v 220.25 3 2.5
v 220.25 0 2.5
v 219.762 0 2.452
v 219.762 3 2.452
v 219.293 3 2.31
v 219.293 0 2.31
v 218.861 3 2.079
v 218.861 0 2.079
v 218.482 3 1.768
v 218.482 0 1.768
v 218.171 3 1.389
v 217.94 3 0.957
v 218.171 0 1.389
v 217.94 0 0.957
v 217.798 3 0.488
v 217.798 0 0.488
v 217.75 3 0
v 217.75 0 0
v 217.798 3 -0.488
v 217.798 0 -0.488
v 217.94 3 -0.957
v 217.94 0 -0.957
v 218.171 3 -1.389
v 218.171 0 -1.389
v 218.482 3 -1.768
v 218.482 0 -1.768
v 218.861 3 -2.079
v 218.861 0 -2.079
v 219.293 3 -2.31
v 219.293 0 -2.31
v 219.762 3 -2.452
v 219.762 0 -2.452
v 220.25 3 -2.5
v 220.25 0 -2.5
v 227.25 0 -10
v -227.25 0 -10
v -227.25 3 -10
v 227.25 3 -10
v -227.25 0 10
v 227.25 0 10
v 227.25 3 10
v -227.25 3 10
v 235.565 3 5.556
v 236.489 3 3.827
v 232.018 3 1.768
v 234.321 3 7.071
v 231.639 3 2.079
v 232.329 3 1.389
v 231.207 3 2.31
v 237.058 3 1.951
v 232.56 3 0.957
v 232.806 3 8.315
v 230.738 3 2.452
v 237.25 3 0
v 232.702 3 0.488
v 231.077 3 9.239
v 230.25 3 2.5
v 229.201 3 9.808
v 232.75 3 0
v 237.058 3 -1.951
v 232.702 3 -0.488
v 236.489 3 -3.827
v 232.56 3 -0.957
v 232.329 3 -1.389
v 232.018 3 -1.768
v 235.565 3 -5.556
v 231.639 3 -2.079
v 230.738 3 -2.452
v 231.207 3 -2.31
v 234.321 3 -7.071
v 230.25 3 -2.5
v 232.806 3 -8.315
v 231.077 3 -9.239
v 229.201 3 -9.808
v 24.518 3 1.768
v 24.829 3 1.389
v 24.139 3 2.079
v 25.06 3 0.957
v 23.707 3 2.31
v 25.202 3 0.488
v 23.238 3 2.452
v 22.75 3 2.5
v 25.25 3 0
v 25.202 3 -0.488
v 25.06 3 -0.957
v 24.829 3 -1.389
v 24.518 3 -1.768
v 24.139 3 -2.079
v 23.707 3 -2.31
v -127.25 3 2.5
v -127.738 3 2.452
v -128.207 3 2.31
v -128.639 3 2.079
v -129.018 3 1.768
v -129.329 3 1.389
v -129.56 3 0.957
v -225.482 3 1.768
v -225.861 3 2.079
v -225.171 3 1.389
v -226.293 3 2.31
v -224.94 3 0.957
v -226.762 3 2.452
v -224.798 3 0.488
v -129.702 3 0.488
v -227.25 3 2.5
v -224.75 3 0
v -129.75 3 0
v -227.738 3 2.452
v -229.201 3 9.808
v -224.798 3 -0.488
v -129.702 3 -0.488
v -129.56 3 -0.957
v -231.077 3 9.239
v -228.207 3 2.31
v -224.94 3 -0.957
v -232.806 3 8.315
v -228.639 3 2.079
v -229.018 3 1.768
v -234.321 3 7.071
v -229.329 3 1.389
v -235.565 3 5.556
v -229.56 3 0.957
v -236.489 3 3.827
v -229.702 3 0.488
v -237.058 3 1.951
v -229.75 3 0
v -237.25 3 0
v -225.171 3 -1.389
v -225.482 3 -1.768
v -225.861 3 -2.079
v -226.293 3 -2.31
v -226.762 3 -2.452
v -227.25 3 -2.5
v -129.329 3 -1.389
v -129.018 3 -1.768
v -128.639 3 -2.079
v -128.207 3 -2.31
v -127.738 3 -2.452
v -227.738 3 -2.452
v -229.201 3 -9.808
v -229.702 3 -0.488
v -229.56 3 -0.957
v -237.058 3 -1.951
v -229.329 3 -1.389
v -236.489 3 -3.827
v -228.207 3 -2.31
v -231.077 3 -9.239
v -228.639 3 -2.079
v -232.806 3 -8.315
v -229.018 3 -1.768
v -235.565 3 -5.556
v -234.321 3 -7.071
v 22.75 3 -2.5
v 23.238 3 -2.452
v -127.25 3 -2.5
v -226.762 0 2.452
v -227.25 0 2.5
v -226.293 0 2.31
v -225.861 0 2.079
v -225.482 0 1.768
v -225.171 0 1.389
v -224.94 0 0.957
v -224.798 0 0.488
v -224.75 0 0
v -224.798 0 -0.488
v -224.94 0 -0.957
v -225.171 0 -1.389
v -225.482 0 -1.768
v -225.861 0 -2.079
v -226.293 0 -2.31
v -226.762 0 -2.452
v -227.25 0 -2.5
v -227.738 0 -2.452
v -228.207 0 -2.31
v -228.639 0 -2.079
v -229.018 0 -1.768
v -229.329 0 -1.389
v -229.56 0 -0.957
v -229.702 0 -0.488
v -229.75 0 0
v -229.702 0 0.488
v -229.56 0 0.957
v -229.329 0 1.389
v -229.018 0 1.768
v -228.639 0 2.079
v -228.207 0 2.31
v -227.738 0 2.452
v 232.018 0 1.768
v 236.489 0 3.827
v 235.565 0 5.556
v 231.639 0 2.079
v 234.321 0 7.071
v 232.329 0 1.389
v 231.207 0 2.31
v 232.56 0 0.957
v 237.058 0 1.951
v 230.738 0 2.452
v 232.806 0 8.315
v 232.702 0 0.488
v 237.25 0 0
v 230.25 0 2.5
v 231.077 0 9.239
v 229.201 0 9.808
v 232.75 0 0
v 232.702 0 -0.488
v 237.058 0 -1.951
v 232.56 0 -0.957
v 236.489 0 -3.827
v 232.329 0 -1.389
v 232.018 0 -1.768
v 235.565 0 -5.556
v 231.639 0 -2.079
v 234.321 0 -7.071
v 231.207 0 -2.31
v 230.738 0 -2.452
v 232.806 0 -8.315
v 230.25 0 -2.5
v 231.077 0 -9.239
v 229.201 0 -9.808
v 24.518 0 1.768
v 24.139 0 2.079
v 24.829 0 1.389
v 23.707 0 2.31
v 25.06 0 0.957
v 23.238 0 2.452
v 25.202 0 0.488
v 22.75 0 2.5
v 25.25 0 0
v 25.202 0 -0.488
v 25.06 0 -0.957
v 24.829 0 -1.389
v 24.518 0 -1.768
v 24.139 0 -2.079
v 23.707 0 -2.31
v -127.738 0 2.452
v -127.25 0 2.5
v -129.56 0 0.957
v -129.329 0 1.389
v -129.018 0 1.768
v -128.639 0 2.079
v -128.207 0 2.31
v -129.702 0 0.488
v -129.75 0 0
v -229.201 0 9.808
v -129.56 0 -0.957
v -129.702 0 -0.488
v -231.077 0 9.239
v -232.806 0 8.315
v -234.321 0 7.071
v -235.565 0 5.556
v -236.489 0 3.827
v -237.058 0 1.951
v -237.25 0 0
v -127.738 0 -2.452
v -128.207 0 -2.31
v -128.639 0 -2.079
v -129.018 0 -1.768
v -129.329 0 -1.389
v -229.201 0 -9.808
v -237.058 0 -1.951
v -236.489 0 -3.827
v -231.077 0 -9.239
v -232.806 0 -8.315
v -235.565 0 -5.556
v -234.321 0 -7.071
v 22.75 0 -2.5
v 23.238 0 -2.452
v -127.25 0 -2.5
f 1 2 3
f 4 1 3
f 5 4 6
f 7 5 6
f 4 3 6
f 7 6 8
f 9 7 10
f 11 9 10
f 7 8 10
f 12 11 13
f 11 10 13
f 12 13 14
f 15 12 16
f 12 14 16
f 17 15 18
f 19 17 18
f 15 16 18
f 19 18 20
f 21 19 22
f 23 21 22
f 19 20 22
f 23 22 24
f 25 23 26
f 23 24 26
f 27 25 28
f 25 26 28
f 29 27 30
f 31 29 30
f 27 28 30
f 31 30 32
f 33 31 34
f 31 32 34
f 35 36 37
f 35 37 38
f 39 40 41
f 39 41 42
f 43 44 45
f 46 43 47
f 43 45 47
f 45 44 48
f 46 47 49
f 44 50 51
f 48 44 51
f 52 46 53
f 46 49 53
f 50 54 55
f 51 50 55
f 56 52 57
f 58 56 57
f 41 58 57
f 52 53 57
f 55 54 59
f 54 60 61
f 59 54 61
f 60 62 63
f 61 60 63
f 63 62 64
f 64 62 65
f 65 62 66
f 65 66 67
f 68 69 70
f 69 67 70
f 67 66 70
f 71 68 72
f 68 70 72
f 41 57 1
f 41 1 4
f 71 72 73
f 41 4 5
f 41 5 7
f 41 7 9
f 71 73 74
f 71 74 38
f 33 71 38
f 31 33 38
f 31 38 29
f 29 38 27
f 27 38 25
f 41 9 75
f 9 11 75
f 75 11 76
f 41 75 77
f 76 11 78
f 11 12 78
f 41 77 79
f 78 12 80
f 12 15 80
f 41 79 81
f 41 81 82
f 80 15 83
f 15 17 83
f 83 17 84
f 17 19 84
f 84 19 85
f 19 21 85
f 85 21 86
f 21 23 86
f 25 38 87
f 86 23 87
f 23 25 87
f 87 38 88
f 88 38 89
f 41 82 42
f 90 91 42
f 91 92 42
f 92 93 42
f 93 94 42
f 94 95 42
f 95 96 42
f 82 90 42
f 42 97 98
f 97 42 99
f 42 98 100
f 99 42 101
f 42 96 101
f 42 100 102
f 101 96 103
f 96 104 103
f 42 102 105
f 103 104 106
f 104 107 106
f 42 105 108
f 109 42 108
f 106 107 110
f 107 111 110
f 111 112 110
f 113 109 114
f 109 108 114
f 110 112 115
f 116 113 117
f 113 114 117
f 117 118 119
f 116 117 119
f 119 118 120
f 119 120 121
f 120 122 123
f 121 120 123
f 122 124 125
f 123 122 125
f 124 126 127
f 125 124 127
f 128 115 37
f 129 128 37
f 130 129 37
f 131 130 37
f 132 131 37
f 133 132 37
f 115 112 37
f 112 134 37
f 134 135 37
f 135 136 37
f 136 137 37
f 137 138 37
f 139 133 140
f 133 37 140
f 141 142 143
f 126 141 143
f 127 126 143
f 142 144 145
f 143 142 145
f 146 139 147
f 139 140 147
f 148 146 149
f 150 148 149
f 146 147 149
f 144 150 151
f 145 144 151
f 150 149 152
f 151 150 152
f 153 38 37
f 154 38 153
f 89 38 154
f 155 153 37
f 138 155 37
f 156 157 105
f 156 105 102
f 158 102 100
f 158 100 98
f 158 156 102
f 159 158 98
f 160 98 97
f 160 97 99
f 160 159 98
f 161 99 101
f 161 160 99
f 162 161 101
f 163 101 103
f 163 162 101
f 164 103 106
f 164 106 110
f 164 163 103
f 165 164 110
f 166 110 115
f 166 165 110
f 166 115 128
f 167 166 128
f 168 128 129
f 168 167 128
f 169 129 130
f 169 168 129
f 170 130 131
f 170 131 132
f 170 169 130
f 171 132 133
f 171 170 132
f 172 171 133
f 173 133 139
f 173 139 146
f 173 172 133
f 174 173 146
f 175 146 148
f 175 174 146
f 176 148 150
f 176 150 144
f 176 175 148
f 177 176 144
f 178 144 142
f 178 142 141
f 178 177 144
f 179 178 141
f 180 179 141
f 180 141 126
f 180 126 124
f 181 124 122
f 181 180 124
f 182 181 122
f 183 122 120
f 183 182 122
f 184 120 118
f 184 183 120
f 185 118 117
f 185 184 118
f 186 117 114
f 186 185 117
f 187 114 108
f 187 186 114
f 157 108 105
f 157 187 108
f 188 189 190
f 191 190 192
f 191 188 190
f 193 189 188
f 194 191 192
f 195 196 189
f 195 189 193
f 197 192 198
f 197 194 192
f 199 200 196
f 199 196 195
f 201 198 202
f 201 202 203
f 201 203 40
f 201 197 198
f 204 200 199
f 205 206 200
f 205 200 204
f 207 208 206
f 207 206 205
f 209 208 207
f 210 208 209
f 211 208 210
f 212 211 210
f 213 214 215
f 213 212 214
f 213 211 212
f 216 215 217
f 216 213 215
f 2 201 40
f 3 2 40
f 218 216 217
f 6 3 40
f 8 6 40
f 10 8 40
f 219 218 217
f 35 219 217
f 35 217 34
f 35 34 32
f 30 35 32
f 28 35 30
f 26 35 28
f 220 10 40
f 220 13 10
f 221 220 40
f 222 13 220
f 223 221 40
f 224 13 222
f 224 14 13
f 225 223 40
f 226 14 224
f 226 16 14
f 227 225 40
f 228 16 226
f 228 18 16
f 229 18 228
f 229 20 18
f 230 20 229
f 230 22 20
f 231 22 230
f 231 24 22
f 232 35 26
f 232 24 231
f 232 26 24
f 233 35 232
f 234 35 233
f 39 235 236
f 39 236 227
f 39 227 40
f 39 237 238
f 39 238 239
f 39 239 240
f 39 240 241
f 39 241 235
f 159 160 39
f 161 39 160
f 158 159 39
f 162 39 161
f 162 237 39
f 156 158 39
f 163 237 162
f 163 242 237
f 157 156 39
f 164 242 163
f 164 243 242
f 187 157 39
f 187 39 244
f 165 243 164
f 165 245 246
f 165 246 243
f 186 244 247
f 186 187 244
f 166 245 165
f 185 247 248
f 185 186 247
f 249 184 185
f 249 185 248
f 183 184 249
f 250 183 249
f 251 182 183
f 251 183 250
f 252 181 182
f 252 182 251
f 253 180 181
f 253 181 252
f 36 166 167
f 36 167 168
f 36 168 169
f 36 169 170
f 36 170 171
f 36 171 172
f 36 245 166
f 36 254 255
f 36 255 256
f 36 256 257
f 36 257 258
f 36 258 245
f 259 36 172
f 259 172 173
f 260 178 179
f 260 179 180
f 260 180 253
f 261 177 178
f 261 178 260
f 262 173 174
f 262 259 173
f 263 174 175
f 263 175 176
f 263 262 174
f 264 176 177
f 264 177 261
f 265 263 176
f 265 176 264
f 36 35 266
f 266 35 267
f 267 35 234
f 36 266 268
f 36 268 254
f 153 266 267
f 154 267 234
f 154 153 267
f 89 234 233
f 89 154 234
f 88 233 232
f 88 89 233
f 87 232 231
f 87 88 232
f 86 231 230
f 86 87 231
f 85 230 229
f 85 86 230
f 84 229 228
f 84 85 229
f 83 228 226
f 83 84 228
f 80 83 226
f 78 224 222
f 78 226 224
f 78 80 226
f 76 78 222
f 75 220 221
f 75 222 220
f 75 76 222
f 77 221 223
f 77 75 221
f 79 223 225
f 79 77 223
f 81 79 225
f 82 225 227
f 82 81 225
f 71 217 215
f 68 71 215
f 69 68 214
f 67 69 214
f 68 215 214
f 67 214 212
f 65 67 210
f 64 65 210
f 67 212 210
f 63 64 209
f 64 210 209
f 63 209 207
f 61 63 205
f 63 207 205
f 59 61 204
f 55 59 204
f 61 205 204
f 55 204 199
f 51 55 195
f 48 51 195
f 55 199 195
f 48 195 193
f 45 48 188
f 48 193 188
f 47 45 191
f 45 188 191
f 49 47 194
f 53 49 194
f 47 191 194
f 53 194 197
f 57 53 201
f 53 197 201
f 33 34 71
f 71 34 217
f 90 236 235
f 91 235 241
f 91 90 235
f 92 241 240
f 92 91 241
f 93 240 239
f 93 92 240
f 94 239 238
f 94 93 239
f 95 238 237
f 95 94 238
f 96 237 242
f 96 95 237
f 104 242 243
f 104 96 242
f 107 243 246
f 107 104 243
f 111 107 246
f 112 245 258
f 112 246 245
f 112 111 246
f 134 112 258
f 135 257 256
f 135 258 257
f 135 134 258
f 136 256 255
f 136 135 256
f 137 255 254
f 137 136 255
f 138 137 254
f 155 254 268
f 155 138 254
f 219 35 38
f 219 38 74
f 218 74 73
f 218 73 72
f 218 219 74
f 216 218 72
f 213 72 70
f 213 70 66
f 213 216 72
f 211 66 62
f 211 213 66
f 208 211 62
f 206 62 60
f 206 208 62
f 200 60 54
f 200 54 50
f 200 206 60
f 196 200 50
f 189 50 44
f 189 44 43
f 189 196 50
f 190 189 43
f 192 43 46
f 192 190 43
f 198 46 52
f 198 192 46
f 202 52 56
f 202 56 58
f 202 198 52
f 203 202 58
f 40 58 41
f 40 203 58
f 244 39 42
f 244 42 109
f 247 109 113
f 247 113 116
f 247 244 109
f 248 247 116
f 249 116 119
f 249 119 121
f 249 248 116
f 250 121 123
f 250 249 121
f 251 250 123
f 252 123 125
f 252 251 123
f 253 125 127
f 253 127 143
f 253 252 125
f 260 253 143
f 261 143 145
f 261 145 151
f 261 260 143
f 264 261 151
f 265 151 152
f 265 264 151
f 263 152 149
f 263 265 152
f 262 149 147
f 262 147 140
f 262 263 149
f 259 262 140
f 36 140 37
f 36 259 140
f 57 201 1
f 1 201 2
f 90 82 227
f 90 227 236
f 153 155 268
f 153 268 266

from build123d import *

# Parameters (mm, degrees)
SKETCH1_R           = 2.5
BOSS_EXTRUDE1_DEPTH = 3
CUT_EXTRUDE1_DEPTH  = 238.479604387


with BuildPart() as part:
    # Sketch1 → Boss-Extrude1 (new body)
    with BuildSketch(Plane(origin=(0, 0, 0), x_dir=(1, 0, 0), z_dir=(0, 1, 0))):
        with BuildLine():
            Line((-227.25, 10), (227.25, 10))
            ThreePointArc((227.25, 10), (237.25, 0), (227.25, -10))
            Line((227.25, -10), (-227.25, -10))
            ThreePointArc((-227.25, -10), (-237.25, 0), (-227.25, 10))
        make_face()
        with Locations(Location((-227.25, 0, 0), (0, 0, 270))):
            Circle(SKETCH1_R, mode=Mode.SUBTRACT)
        with BuildLine():
            Line((230.25, -2.5), (220.25, -2.5))
            ThreePointArc((220.25, -2.5), (217.75, 0), (220.25, 2.5))
            Line((220.25, 2.5), (230.25, 2.5))
            ThreePointArc((230.25, 2.5), (232.75, 0), (230.25, -2.5))
        make_face(mode=Mode.SUBTRACT)
    extrude(amount=BOSS_EXTRUDE1_DEPTH)

    # Sketch2 → Cut-Extrude1 (cut, through all)
    with BuildSketch(Plane(origin=(0, 3, 0), x_dir=(1, 0, 0), z_dir=(0, 1, 0))):
        with BuildLine():
            Line((-127.25, 2.5), (22.75, 2.5))
            ThreePointArc((22.75, 2.5), (25.25, 0), (22.75, -2.5))
            Line((22.75, -2.5), (-127.25, -2.5))
            ThreePointArc((-127.25, -2.5), (-129.75, 0), (-127.25, 2.5))
        make_face()
    extrude(amount=-CUT_EXTRUDE1_DEPTH, mode=Mode.SUBTRACT)


solid = part.part
